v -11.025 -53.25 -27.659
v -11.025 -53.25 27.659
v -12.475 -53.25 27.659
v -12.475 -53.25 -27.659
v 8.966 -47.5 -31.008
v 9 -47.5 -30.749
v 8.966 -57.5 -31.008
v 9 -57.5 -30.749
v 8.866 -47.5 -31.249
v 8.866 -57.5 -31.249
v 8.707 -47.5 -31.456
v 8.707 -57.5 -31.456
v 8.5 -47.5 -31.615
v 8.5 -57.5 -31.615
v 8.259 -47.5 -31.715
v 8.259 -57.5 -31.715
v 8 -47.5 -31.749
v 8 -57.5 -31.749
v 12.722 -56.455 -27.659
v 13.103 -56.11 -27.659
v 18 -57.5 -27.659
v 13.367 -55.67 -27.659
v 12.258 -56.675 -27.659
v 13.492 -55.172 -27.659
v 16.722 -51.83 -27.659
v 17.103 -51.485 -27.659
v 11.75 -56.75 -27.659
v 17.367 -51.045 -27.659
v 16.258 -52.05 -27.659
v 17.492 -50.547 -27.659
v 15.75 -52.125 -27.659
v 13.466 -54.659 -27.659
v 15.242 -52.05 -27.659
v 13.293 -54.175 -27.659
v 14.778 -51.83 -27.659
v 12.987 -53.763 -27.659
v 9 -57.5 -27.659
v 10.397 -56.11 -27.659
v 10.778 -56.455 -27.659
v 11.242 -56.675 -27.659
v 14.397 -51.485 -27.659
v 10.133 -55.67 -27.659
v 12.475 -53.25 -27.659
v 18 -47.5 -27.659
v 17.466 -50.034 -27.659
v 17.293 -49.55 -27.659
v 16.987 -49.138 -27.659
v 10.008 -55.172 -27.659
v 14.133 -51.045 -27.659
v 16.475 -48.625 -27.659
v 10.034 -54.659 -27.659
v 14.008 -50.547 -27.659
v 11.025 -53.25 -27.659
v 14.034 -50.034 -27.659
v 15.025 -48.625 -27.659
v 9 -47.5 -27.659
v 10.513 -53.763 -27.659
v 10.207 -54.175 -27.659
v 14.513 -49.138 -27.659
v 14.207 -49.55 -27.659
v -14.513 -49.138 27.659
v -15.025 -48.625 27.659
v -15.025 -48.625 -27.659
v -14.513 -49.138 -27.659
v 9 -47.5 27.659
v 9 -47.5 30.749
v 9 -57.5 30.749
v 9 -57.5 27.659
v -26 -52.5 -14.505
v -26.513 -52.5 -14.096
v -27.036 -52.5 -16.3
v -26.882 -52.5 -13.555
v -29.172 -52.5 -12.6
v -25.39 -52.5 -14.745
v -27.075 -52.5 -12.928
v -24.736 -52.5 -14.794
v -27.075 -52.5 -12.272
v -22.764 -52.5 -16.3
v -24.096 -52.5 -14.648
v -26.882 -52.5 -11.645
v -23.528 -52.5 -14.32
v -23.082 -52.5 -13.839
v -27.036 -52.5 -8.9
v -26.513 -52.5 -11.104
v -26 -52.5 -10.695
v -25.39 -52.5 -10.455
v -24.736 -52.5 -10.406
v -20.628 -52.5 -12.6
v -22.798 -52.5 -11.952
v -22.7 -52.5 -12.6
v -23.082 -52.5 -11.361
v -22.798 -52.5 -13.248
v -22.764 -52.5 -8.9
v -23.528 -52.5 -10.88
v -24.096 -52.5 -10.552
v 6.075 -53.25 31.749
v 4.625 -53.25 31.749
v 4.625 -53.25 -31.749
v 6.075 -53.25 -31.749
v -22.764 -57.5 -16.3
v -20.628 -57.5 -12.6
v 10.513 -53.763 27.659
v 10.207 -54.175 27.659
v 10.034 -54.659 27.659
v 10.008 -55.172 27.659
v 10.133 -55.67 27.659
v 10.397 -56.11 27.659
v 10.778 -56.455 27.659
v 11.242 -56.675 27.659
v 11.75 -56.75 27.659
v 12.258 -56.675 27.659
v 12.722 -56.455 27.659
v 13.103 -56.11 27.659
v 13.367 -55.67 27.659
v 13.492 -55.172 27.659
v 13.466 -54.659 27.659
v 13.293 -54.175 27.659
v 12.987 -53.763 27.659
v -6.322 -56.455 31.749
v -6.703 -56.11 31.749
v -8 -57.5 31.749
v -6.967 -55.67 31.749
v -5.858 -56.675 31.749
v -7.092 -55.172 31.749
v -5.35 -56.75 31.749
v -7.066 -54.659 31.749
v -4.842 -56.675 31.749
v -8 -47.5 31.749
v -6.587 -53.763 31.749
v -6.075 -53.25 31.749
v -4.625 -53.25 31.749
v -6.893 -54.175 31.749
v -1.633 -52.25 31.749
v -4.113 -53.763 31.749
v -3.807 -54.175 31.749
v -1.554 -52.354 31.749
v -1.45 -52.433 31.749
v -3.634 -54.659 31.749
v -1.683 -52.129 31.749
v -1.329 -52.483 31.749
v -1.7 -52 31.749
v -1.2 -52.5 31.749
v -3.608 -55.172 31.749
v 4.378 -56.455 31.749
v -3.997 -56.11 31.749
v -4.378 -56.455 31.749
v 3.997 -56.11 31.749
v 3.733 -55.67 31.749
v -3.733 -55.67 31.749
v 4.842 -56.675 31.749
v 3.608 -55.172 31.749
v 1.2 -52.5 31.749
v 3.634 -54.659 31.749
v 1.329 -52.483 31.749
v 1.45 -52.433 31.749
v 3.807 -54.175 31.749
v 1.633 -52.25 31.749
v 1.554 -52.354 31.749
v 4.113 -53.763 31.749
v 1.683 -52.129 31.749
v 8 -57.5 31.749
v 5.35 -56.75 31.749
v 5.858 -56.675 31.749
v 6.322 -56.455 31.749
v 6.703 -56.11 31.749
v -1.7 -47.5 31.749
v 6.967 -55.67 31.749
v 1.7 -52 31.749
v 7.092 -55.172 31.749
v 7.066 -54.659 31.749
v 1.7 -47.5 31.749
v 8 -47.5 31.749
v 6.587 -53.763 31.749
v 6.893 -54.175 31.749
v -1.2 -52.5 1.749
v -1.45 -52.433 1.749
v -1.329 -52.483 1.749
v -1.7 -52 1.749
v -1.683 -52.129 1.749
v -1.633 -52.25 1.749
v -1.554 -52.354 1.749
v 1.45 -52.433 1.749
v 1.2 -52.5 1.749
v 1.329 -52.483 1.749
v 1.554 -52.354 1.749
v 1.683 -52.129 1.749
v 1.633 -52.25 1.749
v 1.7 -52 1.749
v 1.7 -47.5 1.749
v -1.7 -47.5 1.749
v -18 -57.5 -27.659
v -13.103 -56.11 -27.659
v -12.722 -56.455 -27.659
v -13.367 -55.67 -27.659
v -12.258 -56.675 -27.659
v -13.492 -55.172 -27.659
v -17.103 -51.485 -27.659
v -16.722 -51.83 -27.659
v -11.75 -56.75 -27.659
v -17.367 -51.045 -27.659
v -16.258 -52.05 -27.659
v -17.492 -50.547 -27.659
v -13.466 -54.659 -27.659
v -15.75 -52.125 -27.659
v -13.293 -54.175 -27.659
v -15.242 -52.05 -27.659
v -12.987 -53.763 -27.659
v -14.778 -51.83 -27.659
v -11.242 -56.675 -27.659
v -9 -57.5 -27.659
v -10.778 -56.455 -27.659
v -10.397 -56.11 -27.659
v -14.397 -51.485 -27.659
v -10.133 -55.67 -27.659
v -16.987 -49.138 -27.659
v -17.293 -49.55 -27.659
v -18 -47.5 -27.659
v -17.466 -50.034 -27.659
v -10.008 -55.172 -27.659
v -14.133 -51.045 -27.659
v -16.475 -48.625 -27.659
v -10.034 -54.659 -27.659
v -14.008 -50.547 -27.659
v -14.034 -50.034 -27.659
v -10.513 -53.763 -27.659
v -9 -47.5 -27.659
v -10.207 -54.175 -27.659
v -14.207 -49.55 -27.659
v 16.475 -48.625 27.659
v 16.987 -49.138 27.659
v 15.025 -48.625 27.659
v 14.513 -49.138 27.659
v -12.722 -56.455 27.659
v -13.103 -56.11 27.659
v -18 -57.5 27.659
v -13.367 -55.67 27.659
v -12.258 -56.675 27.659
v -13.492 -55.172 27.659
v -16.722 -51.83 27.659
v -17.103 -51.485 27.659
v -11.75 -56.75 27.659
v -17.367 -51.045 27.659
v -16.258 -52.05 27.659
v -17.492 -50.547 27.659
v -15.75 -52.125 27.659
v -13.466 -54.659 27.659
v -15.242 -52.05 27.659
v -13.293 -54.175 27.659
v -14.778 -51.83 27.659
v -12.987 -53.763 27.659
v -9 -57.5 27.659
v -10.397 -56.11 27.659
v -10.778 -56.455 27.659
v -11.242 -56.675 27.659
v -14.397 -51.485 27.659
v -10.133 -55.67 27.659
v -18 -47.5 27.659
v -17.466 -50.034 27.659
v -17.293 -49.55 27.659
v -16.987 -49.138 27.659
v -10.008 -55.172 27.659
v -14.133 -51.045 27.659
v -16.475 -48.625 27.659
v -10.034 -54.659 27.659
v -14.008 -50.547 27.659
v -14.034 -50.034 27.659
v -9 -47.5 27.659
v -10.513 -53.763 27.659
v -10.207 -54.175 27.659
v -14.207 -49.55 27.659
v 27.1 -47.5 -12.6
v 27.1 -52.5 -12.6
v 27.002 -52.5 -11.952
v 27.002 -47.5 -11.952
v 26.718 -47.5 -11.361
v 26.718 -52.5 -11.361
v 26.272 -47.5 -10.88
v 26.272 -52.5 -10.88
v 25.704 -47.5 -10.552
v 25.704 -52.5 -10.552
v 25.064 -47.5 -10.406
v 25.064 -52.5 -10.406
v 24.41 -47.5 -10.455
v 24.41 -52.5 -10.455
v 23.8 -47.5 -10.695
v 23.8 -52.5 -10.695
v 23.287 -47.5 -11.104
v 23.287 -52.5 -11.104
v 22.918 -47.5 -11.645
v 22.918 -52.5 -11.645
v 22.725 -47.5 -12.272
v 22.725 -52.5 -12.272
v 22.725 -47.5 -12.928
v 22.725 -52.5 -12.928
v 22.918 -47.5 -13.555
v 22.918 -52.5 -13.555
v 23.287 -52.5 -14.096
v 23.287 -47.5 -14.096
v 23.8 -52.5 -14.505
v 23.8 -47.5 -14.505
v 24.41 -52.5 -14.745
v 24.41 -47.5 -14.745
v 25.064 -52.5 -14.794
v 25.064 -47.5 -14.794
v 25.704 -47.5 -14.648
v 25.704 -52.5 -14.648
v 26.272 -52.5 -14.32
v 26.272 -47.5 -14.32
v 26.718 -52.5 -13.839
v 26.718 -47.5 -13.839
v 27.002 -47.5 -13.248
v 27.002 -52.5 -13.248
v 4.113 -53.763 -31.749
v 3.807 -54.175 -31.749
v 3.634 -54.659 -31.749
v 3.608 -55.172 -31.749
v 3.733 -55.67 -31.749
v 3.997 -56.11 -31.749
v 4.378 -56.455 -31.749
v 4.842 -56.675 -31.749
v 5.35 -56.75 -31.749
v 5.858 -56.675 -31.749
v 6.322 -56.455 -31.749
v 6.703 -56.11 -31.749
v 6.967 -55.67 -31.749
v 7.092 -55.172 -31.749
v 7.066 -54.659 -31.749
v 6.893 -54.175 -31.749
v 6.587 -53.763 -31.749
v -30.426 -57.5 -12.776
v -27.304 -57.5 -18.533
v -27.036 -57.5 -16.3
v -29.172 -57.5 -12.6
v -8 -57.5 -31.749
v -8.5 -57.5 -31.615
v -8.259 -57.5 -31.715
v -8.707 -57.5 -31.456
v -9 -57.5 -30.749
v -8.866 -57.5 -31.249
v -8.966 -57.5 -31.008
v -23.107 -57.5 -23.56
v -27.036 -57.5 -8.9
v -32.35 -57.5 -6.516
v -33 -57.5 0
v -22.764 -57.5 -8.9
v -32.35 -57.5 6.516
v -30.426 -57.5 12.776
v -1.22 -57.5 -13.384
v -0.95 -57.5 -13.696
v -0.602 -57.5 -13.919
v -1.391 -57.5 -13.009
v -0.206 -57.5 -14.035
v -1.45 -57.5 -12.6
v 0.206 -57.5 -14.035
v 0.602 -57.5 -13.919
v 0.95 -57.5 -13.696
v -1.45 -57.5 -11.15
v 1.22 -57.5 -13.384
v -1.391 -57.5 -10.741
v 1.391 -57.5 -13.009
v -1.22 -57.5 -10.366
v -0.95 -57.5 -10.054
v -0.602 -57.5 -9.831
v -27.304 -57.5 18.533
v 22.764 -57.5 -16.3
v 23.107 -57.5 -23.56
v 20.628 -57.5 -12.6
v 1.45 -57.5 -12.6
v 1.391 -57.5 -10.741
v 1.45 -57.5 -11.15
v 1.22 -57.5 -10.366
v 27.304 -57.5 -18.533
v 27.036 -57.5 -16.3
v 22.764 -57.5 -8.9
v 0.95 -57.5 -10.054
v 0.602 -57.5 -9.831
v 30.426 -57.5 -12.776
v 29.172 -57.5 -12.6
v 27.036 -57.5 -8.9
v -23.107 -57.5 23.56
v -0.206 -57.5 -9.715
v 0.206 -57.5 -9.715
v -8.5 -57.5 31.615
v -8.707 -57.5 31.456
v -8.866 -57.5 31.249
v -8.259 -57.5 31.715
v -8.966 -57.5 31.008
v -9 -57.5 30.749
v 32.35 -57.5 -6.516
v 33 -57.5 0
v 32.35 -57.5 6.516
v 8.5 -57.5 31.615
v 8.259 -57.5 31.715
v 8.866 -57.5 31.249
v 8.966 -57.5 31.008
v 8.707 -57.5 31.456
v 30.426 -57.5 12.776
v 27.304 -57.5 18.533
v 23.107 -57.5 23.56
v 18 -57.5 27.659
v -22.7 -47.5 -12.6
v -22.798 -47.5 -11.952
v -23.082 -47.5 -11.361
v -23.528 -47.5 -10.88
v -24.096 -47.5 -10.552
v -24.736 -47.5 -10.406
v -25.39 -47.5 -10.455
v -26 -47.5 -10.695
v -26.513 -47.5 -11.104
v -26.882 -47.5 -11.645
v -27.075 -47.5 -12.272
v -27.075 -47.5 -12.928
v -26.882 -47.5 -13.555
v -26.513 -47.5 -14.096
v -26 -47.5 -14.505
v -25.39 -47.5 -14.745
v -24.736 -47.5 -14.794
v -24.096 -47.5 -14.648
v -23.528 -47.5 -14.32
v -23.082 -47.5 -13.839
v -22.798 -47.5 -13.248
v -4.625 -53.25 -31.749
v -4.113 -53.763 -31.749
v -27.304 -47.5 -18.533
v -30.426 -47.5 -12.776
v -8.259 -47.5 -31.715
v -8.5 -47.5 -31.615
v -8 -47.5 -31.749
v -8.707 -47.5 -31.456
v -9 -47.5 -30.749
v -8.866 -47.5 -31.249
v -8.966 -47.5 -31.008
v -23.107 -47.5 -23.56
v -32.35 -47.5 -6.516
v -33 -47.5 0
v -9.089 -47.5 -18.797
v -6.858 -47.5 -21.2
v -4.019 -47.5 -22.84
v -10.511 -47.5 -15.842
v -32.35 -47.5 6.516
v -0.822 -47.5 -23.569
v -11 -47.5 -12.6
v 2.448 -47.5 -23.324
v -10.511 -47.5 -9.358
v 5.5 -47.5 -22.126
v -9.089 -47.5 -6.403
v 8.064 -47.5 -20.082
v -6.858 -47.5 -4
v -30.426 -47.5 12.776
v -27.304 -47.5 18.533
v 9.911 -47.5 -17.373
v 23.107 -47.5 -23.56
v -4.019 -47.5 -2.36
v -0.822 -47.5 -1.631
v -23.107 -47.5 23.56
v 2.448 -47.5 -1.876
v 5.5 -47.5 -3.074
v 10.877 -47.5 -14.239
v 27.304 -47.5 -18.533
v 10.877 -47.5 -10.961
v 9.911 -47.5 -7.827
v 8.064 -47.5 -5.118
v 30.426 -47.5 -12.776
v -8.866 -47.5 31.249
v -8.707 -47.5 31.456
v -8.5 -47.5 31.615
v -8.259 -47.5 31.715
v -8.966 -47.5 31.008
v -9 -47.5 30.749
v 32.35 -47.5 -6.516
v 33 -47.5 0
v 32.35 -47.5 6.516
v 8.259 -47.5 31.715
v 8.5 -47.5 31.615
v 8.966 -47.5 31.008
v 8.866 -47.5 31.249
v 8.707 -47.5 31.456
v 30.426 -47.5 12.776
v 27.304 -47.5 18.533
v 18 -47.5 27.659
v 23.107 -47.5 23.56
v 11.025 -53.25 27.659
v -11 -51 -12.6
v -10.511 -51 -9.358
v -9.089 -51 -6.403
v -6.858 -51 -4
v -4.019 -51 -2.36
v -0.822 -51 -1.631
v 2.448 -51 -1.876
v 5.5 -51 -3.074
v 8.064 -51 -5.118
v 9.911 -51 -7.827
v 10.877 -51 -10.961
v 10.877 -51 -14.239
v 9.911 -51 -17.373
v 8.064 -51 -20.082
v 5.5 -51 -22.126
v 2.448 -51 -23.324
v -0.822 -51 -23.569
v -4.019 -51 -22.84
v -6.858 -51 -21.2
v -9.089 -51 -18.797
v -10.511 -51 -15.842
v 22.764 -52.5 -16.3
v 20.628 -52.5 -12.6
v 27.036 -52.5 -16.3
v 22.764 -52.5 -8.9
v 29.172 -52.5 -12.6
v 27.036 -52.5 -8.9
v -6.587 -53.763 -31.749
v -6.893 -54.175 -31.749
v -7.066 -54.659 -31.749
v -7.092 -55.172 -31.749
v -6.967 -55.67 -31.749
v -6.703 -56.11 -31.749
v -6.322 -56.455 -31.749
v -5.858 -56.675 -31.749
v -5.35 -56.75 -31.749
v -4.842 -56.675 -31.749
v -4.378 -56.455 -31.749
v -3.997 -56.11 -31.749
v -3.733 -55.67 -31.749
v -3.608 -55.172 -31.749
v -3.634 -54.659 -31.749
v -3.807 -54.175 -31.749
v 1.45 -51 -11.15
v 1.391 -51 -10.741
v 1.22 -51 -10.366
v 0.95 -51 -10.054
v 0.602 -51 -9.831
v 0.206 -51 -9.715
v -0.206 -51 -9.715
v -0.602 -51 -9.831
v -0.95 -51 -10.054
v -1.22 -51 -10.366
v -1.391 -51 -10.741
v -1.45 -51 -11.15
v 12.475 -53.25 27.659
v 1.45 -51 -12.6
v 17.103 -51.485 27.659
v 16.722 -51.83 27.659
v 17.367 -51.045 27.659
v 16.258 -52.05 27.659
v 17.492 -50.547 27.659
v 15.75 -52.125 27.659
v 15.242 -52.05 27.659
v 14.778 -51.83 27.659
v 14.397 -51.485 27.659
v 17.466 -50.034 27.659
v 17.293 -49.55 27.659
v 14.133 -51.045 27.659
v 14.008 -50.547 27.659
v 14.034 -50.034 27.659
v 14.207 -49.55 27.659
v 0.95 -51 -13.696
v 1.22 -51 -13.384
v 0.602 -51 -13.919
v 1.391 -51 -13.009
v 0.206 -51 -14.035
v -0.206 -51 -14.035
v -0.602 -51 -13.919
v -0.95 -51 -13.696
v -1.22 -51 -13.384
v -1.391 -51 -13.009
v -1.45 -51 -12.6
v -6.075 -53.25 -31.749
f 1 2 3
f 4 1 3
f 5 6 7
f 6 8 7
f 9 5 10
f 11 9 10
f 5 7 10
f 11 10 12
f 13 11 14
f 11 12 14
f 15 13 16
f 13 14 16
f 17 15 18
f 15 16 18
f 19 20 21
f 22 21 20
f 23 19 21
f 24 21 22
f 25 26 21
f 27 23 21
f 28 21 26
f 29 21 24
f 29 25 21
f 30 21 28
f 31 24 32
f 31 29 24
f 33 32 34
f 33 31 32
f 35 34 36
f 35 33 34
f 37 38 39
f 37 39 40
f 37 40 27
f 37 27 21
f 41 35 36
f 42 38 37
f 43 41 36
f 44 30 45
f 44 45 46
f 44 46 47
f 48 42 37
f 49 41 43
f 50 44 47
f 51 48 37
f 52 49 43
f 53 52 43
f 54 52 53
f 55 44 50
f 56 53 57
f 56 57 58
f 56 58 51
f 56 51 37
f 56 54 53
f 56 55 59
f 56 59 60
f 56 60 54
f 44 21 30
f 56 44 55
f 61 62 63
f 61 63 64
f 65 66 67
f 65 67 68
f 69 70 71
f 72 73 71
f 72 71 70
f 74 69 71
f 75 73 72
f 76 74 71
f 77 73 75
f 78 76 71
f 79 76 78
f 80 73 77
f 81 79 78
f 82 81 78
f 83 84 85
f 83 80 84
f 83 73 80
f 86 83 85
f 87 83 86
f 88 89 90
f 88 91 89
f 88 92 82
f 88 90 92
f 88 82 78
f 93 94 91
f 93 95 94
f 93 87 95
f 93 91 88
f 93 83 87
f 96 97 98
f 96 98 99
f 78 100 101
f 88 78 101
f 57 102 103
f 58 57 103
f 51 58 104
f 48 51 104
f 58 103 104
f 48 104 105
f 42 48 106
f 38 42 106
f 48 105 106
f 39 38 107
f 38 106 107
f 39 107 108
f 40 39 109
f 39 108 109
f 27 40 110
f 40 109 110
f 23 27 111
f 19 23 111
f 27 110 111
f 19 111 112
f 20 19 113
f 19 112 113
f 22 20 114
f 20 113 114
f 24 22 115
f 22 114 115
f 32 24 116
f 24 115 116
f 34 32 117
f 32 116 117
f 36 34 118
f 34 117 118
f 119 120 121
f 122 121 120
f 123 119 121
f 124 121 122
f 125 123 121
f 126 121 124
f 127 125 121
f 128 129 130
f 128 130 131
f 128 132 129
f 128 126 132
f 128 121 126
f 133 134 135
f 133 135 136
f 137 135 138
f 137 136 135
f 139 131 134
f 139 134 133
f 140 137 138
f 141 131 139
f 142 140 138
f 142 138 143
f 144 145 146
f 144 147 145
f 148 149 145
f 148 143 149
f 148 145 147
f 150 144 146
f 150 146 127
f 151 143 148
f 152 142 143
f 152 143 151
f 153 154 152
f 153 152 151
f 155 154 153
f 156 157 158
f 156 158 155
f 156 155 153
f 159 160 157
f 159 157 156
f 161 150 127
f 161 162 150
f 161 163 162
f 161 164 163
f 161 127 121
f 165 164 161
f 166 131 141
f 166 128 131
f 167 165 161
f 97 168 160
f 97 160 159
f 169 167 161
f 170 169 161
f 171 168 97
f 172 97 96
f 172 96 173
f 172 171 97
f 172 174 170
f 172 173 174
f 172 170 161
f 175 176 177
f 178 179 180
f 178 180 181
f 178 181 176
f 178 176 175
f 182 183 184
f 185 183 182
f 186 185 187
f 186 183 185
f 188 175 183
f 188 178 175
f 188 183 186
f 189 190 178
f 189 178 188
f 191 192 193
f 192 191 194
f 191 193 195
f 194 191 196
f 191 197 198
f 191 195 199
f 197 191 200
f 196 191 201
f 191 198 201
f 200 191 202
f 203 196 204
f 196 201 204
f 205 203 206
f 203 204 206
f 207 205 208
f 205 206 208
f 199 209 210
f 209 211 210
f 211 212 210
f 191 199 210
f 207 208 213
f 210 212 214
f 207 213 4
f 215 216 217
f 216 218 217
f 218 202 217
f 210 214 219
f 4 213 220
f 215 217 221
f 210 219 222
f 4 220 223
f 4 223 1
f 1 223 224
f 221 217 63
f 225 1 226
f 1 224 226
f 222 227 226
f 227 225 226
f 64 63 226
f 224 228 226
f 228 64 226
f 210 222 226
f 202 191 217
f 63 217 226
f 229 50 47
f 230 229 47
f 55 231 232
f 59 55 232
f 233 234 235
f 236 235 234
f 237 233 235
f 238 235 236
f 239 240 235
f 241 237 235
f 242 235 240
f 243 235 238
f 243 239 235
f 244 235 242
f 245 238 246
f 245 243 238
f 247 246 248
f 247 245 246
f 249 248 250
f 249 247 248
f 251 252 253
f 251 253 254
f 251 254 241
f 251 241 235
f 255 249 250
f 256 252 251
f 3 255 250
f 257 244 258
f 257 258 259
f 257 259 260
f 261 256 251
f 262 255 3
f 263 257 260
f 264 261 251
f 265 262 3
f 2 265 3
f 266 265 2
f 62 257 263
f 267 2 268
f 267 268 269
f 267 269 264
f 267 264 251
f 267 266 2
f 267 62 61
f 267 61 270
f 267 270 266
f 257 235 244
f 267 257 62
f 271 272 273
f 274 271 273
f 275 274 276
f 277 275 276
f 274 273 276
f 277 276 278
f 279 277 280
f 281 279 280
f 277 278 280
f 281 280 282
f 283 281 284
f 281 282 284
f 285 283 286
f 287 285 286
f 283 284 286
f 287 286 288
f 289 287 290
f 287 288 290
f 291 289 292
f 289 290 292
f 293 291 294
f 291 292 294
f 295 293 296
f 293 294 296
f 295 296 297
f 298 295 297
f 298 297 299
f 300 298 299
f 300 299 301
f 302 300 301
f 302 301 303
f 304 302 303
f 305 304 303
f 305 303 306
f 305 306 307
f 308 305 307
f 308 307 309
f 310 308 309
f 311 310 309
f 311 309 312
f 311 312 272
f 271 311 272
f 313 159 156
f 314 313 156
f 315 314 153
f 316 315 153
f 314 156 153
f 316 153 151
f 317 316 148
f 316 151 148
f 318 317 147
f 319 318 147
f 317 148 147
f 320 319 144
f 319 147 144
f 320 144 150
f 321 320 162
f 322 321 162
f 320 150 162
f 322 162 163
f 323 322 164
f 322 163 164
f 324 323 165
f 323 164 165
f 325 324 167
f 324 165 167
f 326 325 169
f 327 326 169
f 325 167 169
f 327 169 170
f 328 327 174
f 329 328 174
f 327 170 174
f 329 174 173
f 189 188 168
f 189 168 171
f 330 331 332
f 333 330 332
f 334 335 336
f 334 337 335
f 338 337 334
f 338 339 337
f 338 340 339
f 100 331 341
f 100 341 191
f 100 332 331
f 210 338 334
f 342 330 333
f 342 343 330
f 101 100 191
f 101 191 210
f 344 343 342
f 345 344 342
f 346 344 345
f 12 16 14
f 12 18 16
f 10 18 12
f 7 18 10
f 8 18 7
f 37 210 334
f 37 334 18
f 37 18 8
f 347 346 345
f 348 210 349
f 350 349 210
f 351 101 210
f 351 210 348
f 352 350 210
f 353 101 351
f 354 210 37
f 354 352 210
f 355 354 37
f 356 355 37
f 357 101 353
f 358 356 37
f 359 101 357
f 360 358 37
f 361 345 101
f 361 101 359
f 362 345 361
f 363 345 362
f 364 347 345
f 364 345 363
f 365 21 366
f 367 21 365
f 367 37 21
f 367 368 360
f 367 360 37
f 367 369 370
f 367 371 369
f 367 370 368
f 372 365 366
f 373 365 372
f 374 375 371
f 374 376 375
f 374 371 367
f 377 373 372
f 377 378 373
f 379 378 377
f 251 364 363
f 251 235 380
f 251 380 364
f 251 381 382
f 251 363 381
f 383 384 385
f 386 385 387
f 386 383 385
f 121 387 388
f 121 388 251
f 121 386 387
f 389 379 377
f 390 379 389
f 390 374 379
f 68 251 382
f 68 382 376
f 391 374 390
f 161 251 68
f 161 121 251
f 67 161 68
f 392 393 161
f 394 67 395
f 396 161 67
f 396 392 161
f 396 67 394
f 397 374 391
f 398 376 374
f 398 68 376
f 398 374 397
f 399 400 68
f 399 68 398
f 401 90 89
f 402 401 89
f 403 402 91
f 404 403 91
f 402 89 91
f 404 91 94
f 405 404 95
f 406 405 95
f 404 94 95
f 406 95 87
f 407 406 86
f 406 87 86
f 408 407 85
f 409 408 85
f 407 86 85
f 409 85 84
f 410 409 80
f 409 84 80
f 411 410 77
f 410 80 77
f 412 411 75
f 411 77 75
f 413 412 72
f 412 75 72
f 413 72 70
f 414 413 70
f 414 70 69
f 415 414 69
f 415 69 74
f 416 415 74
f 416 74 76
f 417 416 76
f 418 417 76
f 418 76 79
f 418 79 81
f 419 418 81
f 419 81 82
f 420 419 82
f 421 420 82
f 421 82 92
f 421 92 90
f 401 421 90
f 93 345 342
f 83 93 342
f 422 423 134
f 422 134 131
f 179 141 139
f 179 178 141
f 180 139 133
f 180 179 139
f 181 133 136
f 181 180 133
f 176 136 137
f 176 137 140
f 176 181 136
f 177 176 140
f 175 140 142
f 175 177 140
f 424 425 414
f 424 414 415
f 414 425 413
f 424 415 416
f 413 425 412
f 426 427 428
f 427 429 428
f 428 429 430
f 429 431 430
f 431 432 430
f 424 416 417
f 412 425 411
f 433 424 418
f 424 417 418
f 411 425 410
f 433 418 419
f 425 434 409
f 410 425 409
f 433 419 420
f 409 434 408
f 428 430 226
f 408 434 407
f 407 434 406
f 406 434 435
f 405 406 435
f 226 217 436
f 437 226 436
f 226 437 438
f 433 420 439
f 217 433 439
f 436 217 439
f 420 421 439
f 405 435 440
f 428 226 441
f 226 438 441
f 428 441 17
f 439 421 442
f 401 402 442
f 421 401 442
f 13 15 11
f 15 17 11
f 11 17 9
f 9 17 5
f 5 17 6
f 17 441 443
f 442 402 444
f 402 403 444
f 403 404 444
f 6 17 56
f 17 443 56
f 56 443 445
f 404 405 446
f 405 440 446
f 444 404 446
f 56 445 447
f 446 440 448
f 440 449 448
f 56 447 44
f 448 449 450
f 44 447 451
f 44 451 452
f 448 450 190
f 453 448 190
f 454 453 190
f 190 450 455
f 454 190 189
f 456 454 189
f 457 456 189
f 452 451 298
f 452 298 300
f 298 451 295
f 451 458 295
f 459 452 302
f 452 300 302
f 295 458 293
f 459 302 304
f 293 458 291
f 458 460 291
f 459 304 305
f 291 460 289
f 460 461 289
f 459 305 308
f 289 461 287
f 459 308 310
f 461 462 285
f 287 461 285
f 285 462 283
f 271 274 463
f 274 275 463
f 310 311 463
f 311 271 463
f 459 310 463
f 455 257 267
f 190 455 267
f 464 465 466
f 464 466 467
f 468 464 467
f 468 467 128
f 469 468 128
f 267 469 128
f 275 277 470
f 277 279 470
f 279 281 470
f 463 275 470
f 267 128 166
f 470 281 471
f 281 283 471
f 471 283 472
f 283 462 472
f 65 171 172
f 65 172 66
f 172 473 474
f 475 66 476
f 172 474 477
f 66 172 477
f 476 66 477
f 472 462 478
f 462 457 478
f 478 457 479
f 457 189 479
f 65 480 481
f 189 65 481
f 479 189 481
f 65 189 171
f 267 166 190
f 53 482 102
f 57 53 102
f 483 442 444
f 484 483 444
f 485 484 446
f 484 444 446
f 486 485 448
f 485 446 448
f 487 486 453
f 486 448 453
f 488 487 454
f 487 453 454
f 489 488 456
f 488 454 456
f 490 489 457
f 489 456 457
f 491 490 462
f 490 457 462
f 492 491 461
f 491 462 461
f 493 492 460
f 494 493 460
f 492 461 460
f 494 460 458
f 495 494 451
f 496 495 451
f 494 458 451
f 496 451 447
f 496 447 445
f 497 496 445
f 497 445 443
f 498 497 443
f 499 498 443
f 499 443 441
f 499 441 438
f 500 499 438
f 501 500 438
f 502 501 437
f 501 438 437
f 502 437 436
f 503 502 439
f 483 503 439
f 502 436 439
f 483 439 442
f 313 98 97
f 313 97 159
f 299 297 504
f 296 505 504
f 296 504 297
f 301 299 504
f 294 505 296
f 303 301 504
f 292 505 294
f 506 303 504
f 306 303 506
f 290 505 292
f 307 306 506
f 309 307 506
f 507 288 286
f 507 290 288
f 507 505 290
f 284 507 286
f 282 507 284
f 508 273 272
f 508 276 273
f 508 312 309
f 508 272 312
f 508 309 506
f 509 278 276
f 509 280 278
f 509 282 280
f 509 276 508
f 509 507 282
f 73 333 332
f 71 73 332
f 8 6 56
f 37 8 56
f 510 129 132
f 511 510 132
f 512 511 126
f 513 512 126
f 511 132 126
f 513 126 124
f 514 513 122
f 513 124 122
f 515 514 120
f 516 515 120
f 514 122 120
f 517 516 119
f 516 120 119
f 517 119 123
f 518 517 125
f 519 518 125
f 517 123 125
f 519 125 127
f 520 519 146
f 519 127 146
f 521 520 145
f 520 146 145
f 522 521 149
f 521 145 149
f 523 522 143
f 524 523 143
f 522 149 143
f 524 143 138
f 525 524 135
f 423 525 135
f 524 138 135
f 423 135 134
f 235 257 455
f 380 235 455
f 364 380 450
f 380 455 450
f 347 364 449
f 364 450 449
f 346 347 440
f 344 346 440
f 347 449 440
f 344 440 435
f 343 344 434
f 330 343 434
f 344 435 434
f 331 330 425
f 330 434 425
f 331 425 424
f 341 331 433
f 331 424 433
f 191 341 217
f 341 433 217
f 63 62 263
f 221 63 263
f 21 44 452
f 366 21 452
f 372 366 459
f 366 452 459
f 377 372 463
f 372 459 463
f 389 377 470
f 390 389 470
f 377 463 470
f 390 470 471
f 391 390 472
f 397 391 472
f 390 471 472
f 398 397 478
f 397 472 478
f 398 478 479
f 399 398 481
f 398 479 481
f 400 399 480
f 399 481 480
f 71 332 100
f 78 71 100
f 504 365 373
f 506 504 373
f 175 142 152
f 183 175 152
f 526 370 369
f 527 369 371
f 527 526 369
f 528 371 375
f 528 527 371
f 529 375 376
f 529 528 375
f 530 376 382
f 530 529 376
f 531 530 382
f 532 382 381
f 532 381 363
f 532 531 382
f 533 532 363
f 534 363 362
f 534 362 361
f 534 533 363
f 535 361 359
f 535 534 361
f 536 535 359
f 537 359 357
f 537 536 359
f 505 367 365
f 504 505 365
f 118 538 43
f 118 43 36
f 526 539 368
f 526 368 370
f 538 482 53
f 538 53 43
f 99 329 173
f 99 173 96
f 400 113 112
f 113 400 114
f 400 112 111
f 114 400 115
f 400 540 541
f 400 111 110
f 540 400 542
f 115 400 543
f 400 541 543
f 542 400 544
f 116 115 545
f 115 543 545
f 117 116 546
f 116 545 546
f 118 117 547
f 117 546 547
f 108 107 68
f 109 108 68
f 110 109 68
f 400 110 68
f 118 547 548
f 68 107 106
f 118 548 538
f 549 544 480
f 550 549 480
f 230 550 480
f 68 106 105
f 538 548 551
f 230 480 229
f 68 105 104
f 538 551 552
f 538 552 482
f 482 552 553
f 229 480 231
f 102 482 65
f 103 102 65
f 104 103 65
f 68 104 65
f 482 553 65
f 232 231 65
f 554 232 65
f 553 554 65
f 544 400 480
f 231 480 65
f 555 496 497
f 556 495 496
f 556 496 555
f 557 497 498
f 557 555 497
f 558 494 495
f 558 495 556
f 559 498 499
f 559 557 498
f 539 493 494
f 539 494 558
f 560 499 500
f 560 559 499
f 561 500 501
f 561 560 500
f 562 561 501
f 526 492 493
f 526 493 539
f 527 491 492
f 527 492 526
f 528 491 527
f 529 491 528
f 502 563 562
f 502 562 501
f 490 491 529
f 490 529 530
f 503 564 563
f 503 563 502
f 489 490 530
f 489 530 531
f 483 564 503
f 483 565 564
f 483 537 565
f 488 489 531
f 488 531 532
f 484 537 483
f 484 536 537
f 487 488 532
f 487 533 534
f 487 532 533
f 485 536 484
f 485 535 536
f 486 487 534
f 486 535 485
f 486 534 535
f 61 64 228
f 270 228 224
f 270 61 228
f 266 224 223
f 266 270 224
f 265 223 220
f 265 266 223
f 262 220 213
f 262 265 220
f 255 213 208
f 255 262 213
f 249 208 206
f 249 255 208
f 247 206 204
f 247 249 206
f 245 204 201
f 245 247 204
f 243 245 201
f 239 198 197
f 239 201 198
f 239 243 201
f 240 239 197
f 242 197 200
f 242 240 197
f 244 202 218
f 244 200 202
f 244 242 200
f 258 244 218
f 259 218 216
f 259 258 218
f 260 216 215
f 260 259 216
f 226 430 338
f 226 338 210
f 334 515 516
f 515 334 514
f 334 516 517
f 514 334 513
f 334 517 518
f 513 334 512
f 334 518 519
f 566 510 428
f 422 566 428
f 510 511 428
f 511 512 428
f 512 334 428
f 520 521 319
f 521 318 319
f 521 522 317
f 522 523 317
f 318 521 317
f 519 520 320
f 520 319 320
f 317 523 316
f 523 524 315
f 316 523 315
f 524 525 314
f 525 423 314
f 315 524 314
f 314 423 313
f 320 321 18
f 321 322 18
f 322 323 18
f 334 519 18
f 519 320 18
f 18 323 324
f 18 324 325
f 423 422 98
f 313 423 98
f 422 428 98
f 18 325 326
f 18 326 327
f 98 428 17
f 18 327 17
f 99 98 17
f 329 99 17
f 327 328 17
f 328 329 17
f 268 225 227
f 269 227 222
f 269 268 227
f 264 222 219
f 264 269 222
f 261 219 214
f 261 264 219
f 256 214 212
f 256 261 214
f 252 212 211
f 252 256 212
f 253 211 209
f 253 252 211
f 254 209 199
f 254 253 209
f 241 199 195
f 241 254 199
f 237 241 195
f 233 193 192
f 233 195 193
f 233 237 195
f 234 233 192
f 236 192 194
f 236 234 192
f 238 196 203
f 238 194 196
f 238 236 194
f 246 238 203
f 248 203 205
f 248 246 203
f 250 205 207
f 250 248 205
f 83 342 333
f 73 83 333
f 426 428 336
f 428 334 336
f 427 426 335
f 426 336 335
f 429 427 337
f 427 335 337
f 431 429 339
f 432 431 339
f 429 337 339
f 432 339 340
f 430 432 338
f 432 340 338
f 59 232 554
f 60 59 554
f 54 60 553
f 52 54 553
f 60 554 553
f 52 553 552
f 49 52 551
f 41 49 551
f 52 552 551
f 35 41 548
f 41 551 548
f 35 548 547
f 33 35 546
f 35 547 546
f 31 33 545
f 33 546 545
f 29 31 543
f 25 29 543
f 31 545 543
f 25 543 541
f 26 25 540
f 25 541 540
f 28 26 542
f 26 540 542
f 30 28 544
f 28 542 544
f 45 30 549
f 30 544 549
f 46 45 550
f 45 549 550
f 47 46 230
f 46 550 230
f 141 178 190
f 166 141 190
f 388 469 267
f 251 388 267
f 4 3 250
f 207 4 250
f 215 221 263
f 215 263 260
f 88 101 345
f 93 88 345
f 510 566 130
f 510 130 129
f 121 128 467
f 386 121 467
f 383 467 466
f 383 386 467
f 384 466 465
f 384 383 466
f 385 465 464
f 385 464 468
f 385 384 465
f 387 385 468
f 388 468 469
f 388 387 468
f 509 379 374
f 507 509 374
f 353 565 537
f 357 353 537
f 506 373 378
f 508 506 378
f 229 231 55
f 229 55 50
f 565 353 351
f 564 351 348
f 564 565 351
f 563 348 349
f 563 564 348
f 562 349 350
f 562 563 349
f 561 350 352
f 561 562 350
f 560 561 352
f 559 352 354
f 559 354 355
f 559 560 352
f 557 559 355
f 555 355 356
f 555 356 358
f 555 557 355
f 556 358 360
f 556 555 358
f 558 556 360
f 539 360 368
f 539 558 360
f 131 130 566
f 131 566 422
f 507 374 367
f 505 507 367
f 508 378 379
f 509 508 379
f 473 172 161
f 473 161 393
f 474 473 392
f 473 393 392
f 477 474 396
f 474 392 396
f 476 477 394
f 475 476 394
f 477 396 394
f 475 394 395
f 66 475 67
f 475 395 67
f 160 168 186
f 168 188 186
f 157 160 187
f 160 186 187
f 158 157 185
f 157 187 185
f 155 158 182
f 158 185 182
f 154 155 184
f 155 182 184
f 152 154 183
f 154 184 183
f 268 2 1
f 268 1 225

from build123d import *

# Parameters (mm, degrees)
PAD012_DEPTH    = 10
SKETCH027_W     = 3.4
SKETCH027_H     = 5
POCKET_DEPTH    = 30
POCKET012_DEPTH = 63.499031
SKETCH029_R     = 11
POCKET013_DEPTH = 3.5
POCKET014_DEPTH = 5
SKETCH031_R     = 2.2
POCKET015_DEPTH = 5.001
POCKET016_DEPTH = 243.669334
FILLET_R        = 0.5
FILLET001_R     = 1
FILLET002_R     = 1


with BuildPart() as part:
    # Sketch026 (on ShapeBinder) → Pad012 (new body)
    with BuildSketch(Plane.XZ.offset(47.5)):
        with BuildLine():
            ThreePointArc((18, -27.658633), (33, 0), (18, 27.658633))
            Line((18, 27.658633), (9, 27.658633))
            Line((9, 31.749016), (9, 27.658633))
            Line((-9, 31.749016), (9, 31.749016))
            Line((-9, 31.749016), (-9, 27.658633))
            Line((-18, 27.658633), (-9, 27.658633))
            ThreePointArc((-18, 27.658633), (-33, 0), (-18, -27.658633))
            Line((-18, -27.658633), (-9, -27.658633))
            Line((-9, -31.749016), (-9, -27.658633))
            Line((-9, -31.749016), (9, -31.749016))
            Line((9, -31.749016), (9, -27.658633))
            Line((18, -27.658633), (9, -27.658633))
        make_face()
        with BuildLine():
            ThreePointArc((-1.45, -12.6), (0, -14.05), (1.45, -12.6))
            Line((1.45, -12.6), (1.45, -11.15))
            ThreePointArc((1.45, -11.15), (0, -9.7), (-1.45, -11.15))
            Line((-1.45, -12.6), (-1.45, -11.15))
        make_face(mode=Mode.SUBTRACT)
    extrude(amount=PAD012_DEPTH)

    # Sketch027 (on Face4 of Pad012) → Pocket (cut)
    with BuildSketch(Plane(origin=(0, -4.5, 31.749016), x_dir=(1, 0, 0), z_dir=(0, 0, 1))):
        with Locations((0, -45.5)):
            Rectangle(SKETCH027_W, SKETCH027_H)
    extrude(amount=-POCKET_DEPTH, mode=Mode.SUBTRACT)

    # Sketch028 (on Face14 of Pocket) → Pocket012 (cut, through all)
    with BuildSketch(Plane(origin=(0, -4.5, 31.749016), x_dir=(1, 0, 0), z_dir=(0, 0, 1))):
        with BuildLine():
            Line((-6.074874, -48.75), (-4.625126, -48.75))
            Line((-4.112563, -49.262563), (-4.625126, -48.75))
            ThreePointArc((-6.587437, -49.262563), (-5.35, -52.25), (-4.112563, -49.262563))
            Line((-6.074874, -48.75), (-6.587437, -49.262563))
        make_face()
        with BuildLine():
            Line((4.625126, -48.75), (6.074874, -48.75))
            Line((6.587437, -49.262563), (6.074874, -48.75))
            ThreePointArc((4.112563, -49.262563), (5.35, -52.25), (6.587437, -49.262563))
            Line((4.625126, -48.75), (4.112563, -49.262563))
        make_face()
    extrude(amount=-POCKET012_DEPTH, mode=Mode.SUBTRACT)

    # Sketch029 (on Face4 of Pocket012) → Pocket013 (cut)
    with BuildSketch(Plane(origin=(0, -47.5, 0), x_dir=(-1, 0, 0), z_dir=(0, 1, 0))):
        with Locations((0, -12.6)):
            Circle(SKETCH029_R)
    extrude(amount=-POCKET013_DEPTH, mode=Mode.SUBTRACT)

    # Sketch030 (on Face5 of Pocket013) → Pocket014 (cut)
    with BuildSketch(Plane.XZ.offset(57.5)):
        Polygon((27.036196, -16.3), (29.172392, -12.6), (27.036196, -8.9), (22.763804, -8.9), (20.627608, -12.6), (22.763804, -16.3), align=None)
        Polygon((-22.763804, -16.3), (-20.627608, -12.6), (-22.763804, -8.9), (-27.036196, -8.9), (-29.172392, -12.6), (-27.036196, -16.3), align=None)
    extrude(amount=-POCKET014_DEPTH, mode=Mode.SUBTRACT)

    # Sketch031 (on Face46 of Pocket014) → Pocket015 (cut, through all)
    with BuildSketch(Plane.XZ.offset(52.5)):
        with Locations((24.9, -12.6)):
            Circle(SKETCH031_R)
        with Locations((-24.9, -12.6)):
            Circle(SKETCH031_R)
    extrude(amount=-POCKET015_DEPTH, mode=Mode.SUBTRACT)

    # Sketch032 (on Face3 of Pocket015) → Pocket016 (cut, through all)
    with BuildSketch(Plane(origin=(0, -4.5, 27.658633), x_dir=(1, 0, 0), z_dir=(0, 0, 1))):
        with BuildLine():
            Line((11.025126, -48.75), (12.474874, -48.75))
            Line((12.474874, -48.75), (12.987437, -49.262563))
            ThreePointArc((10.512563, -49.262563), (11.75, -52.25), (12.987437, -49.262563))
            Line((11.025126, -48.75), (10.512563, -49.262563))
        make_face()
        with BuildLine():
            Line((15.025126, -44.125), (16.474874, -44.125))
            Line((16.474874, -44.125), (16.987437, -44.637563))
            ThreePointArc((14.512563, -44.637563), (15.75, -47.625), (16.987437, -44.637563))
            Line((15.025126, -44.125), (14.512563, -44.637563))
        make_face()
    pocket016 = extrude(amount=-POCKET016_DEPTH, mode=Mode.SUBTRACT)

    # Mirrored: Pocket016 across Sketch032 V_Axis
    add(pocket016.mirror(Plane(origin=(0, -4.5, 27.658633), x_dir=(0, 0, 1), z_dir=(1, 0, 0))), mode=Mode.SUBTRACT)

    # Fillet
    fillet_edges = [part.edges().sort_by_distance(p)[0] for p in [
        (-1.7, -52.5, 16.749016),
        (1.7, -52.5, 16.749016),
    ]]
    fillet(fillet_edges, radius=FILLET_R)

    # Fillet001
    fillet001_edges = [part.edges().sort_by_distance(p)[0] for p in [
        (-9, -52.5, 31.749016),
        (9, -52.5, 31.749016),
    ]]
    fillet(fillet001_edges, radius=FILLET001_R)

    # Fillet002
    fillet002_edges = [part.edges().sort_by_distance(p)[0] for p in [
        (9, -52.5, -31.749016),
        (-9, -52.5, -31.749016),
    ]]
    fillet(fillet002_edges, radius=FILLET002_R)


solid = part.part
